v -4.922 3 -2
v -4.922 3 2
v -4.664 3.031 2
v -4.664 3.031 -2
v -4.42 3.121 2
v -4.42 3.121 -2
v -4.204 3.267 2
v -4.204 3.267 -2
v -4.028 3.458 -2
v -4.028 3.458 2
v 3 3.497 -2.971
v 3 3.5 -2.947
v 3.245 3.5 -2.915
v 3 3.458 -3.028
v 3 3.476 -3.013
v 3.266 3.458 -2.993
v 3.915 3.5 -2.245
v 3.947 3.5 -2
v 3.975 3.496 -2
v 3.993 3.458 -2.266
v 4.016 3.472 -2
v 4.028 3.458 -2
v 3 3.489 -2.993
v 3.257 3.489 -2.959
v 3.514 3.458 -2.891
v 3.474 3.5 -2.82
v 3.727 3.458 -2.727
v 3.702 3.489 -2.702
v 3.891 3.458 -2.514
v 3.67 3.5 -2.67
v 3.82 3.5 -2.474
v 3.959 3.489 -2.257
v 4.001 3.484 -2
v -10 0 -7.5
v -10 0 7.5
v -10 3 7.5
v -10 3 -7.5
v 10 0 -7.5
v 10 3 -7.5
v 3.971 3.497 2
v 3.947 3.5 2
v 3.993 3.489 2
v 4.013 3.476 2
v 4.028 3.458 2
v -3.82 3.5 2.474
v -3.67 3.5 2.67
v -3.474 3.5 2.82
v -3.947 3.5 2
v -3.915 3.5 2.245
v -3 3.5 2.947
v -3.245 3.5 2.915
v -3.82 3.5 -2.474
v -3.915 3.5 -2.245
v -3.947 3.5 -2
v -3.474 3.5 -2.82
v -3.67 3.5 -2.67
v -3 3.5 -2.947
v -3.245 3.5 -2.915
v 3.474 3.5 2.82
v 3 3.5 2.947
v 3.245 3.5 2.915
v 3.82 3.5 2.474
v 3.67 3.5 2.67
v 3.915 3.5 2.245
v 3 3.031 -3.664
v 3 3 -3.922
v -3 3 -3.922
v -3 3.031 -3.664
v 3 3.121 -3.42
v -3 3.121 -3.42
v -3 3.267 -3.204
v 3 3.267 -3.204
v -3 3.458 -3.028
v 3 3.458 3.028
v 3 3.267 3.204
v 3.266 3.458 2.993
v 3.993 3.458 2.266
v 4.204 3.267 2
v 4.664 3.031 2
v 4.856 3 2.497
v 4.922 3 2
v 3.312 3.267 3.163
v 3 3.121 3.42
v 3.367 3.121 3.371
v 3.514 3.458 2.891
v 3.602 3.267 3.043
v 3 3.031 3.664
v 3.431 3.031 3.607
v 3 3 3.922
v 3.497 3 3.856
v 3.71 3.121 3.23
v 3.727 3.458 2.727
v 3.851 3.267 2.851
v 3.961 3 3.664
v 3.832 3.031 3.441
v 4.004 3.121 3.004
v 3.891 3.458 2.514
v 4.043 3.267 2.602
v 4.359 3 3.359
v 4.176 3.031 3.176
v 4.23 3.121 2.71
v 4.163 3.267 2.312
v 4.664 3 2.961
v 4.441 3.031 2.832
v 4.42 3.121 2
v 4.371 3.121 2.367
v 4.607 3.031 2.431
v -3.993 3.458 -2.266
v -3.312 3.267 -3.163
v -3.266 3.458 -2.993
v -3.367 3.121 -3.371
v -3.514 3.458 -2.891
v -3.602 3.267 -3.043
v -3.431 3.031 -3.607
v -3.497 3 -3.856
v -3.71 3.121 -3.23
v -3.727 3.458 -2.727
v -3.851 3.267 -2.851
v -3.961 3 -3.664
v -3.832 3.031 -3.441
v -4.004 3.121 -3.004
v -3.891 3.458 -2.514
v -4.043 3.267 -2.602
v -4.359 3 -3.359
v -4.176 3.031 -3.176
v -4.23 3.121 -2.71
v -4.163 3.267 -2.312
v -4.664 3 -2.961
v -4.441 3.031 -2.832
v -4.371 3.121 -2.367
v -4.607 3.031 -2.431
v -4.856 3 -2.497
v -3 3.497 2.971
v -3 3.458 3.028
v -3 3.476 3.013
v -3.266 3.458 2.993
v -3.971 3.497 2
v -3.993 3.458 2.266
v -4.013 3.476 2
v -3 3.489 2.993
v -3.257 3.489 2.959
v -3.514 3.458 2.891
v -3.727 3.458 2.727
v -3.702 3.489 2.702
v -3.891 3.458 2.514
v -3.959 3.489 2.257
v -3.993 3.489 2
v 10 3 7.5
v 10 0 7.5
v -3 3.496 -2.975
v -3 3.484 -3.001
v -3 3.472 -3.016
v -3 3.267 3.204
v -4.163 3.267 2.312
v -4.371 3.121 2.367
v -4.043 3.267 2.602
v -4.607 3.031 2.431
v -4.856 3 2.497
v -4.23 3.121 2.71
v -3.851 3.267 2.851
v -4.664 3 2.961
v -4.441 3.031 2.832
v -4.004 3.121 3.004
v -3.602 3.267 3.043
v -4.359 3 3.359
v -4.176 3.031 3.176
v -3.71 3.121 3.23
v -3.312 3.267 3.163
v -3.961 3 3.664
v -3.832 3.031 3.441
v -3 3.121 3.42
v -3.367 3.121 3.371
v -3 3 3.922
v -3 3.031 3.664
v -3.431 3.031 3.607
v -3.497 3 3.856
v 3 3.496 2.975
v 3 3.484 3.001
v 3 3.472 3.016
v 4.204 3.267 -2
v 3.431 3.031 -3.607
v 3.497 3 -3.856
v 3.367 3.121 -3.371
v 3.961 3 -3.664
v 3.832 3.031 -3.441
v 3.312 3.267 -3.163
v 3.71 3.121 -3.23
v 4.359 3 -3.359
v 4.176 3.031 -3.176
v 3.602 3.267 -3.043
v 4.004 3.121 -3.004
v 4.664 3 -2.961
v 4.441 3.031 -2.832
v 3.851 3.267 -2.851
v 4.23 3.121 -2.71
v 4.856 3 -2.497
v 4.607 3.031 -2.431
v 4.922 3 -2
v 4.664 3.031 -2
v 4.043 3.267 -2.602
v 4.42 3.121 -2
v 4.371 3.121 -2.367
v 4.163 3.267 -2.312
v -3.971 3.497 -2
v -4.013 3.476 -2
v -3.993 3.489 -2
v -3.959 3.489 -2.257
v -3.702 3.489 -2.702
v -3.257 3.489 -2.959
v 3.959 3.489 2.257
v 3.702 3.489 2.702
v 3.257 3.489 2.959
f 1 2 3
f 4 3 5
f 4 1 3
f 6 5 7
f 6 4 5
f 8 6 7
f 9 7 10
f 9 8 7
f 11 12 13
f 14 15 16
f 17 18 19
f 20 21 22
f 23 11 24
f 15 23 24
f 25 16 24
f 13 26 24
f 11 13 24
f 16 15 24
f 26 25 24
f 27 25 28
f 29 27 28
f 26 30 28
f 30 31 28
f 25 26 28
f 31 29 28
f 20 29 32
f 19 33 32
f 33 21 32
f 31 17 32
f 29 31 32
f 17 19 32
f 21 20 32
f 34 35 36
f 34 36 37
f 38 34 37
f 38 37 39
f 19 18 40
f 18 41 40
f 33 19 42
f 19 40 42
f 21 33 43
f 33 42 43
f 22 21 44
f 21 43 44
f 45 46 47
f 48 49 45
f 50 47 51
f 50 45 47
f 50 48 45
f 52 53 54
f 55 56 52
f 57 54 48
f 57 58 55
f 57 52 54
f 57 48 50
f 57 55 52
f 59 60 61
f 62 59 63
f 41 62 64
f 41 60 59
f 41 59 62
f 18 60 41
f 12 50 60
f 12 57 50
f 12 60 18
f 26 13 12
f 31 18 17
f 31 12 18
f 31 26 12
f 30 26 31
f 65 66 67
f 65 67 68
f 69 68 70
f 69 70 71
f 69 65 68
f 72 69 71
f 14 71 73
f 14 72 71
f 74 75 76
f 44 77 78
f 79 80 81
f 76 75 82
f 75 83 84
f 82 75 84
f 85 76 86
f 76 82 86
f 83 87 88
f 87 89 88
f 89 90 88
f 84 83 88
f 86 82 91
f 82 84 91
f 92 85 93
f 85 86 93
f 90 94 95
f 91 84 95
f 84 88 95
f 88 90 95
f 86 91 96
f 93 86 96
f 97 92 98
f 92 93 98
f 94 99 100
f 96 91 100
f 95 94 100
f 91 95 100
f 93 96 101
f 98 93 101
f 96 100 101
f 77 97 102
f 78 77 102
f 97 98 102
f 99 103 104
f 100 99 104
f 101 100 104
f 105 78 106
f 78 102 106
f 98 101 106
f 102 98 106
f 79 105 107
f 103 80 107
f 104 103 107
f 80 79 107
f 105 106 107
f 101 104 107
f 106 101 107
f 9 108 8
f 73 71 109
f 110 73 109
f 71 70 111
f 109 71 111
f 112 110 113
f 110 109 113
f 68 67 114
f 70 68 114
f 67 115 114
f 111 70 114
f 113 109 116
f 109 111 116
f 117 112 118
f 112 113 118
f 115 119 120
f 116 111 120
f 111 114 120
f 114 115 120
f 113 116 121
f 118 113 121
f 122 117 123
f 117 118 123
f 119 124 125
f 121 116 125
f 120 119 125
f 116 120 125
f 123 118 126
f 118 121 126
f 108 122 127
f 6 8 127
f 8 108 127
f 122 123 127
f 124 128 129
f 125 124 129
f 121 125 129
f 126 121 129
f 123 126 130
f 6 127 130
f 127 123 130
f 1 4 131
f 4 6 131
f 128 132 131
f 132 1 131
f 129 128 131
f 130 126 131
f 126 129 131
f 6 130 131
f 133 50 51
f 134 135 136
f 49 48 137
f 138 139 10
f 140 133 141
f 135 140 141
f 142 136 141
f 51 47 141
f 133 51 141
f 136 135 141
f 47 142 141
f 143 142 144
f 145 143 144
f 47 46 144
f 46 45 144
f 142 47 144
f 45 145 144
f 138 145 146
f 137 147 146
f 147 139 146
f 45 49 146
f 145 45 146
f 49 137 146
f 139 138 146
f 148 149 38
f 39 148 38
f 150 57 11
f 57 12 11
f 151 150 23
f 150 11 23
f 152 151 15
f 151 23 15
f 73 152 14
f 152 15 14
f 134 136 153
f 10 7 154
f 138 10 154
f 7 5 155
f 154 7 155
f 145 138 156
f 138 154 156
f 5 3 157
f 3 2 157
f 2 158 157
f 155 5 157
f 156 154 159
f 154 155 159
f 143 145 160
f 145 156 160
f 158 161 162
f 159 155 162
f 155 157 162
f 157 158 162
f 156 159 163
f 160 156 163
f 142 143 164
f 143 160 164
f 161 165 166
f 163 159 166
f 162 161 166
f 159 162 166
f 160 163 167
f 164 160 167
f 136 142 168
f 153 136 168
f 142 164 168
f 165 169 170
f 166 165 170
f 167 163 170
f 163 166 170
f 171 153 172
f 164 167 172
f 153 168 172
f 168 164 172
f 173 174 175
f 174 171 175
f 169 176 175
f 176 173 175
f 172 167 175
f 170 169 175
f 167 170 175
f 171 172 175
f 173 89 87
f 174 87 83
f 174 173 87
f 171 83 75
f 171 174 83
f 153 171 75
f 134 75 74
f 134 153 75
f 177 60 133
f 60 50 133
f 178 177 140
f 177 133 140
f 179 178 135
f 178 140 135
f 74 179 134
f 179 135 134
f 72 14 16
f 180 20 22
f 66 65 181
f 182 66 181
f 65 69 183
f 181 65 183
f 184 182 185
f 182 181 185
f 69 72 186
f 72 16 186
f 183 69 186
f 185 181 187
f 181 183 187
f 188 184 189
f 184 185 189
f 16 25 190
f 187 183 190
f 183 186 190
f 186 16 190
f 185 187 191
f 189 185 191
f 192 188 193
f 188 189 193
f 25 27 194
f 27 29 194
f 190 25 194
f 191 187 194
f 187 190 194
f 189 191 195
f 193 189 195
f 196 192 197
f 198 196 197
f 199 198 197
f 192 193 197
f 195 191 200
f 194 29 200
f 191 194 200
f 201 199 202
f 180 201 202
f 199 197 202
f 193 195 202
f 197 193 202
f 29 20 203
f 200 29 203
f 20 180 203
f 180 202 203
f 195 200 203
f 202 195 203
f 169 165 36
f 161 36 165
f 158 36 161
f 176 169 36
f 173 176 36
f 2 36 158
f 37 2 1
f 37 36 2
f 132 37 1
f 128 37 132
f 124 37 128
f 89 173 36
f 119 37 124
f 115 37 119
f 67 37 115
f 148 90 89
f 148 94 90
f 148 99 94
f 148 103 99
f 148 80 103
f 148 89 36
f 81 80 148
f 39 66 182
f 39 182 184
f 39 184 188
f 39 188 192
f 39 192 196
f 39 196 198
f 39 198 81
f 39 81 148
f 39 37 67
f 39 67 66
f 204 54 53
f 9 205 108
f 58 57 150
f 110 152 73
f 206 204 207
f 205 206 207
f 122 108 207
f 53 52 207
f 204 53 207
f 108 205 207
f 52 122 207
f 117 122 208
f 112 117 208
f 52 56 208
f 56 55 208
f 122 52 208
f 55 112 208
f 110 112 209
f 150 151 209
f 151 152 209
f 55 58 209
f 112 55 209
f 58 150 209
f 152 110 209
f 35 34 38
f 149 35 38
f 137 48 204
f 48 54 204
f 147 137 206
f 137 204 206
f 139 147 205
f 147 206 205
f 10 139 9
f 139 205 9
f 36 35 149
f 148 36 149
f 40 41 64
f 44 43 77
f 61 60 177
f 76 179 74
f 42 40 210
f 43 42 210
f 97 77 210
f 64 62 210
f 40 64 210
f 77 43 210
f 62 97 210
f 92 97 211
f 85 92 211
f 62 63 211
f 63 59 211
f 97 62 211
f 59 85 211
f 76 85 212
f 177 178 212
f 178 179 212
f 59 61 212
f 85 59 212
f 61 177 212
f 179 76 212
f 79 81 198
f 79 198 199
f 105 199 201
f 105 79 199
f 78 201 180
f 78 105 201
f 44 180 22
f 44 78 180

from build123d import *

# Parameters (mm, degrees)
SKETCH_1_W      = 20
SKETCH_1_H      = 15
EXTRUDE_1_DEPTH = 3
SKETCH_2_W      = 8
SKETCH_2_H      = 6
EXTRUDE_2_DEPTH = 0.5
FILLET_1_R      = 1
FILLET_2_R      = 1.1
FILLET_3_R      = 0.1


with BuildPart() as part:
    # 草图1 → 凸台-拉伸1 (new body)
    with BuildSketch(Plane(origin=(0, 0, 0), x_dir=(1, 0, 0), z_dir=(0, 1, 0))):
        Rectangle(SKETCH_1_W, SKETCH_1_H)
    extrude(amount=EXTRUDE_1_DEPTH)

    # 草图2 → 凸台-拉伸2 (add)
    with BuildSketch(Plane(origin=(0, 3, 0), x_dir=(1, 0, 0), z_dir=(0, 1, 0))):
        Rectangle(SKETCH_2_W, SKETCH_2_H)
    extrude(amount=EXTRUDE_2_DEPTH)

    # 圆角1
    fillet_1_edges = [part.edges().sort_by_distance(p)[0] for p in [
        (-4, 3.25, -3),
        (-4, 3.25, 3),
        (4, 3.25, 3),
        (4, 3.25, -3),
    ]]
    fillet(fillet_1_edges, radius=FILLET_1_R)

    # 圆角2
    # the kernel refuses this fillet: 1.1 mm, written as the material it adds along each edge
    with BuildSketch(Plane(origin=(3, 3, 2), x_dir=(0, 0, 1), z_dir=(-1, 0, 0))) as fillet_2_piece_1:
        with BuildLine():
            CenterArc((1.921954446, 1.1), FILLET_2_R, 213.055731151, 56.944268849)
            Line((1, 0.5), (0.981560911, 0.488))
            ThreePointArc((0.981560911, 0.488), (0.978, 0.25), (0.978, 0))
            Line((0.978, 0), (1, -0.022))
            Line((1, -0.022), (1.921954446, -0.022))
            Line((1.921954446, -0.022), (1.921954446, 0))
        make_face()
    revolve(axis=Axis((3, 3, 2), (0, 1, 0)), revolution_arc=90)
    with BuildSketch(Plane(origin=(-3, 3, 3), x_dir=(0, 0, 1), z_dir=(1, 0, 0)), Plane(origin=(3, 3, -3), x_dir=(0, 0, -1), z_dir=(-1, 0, 0))) as fillet_2_piece_2:
        with BuildLine():
            CenterArc((0.921954446, -1.1), FILLET_2_R, 90, 56.944268849)
            Line((0, -0.5), (-0.018439089, -0.488))
            ThreePointArc((-0.018439089, -0.488), (-0.022, -0.25), (-0.022, 0))
            Line((-0.022, 0), (0, 0.022))
            Line((0, 0.022), (0.921954446, 0.022))
            Line((0.921954446, 0.022), (0.921954446, 0))
        make_face()
    extrude(amount=6)
    with BuildSketch(Plane(origin=(-3, 3, 2), x_dir=(-1, 0, 0), z_dir=(0, 0, -1))) as fillet_2_piece_3:
        with BuildLine():
            CenterArc((1.921954446, 1.1), FILLET_2_R, 213.055731151, 56.944268849)
            Line((1, 0.5), (0.981560911, 0.488))
            ThreePointArc((0.981560911, 0.488), (0.978, 0.25), (0.978, 0))
            Line((0.978, 0), (1, -0.022))
            Line((1, -0.022), (1.921954446, -0.022))
            Line((1.921954446, -0.022), (1.921954446, 0))
        make_face()
    revolve(axis=Axis((-3, 3, 2), (0, 1, 0)), revolution_arc=90)
    with BuildSketch(Plane(origin=(-4, 3, -2), x_dir=(-1, 0, 0), z_dir=(0, 0, 1)), Plane(origin=(4, 3, 2), x_dir=(1, 0, 0), z_dir=(0, 0, -1))) as fillet_2_piece_4:
        with BuildLine():
            CenterArc((0.921954446, -1.1), FILLET_2_R, 90, 56.944268849)
            Line((0, -0.5), (-0.018439089, -0.488))
            ThreePointArc((-0.018439089, -0.488), (-0.022, -0.25), (-0.022, 0))
            Line((-0.022, 0), (0, 0.022))
            Line((0, 0.022), (0.921954446, 0.022))
            Line((0.921954446, 0.022), (0.921954446, 0))
        make_face()
    extrude(amount=4)
    with BuildSketch(Plane(origin=(-3, 3, -2), x_dir=(0, 0, -1), z_dir=(1, 0, 0))) as fillet_2_piece_5:
        with BuildLine():
            CenterArc((1.921954446, 1.1), FILLET_2_R, 213.055731151, 56.944268849)
            Line((1, 0.5), (0.981560911, 0.488))
            ThreePointArc((0.981560911, 0.488), (0.978, 0.25), (0.978, 0))
            Line((0.978, 0), (1, -0.022))
            Line((1, -0.022), (1.921954446, -0.022))
            Line((1.921954446, -0.022), (1.921954446, 0))
        make_face()
    revolve(axis=Axis((-3, 3, -2), (0, 1, 0)), revolution_arc=90)
    with BuildSketch(Plane(origin=(3, 3, -2), x_dir=(0, 0, -1), z_dir=(-1, 0, 0))) as fillet_2_piece_6:
        with BuildLine():
            CenterArc((1.921954446, -1.1), FILLET_2_R, 90, 56.944268849)
            Line((1, -0.5), (0.981560911, -0.488))
            ThreePointArc((0.981560911, -0.488), (0.978, -0.25), (0.978, 0))
            Line((0.978, 0), (1, 0.022))
            Line((1, 0.022), (1.921954446, 0.022))
            Line((1.921954446, 0.022), (1.921954446, 0))
        make_face()
    revolve(axis=Axis((3, 3, -2), (0, -1, 0)), revolution_arc=90)

    # 圆角3
    fillet_3_edges = [part.edges().sort_by_distance(p)[0] for p in [
        (-4, 3.5, 0),
        (0, 3.5, -3),
        (0, 3.5, 3),
        (4, 3.5, 0),
        (-3.707106781, 3.5, 2.707106781),
        (3.707106781, 3.5, 2.707106781),
        (3.707106781, 3.5, -2.707106781),
        (-3.707106781, 3.5, -2.707106781),
    ]]
    fillet(fillet_3_edges, radius=FILLET_3_R)


solid = part.part
